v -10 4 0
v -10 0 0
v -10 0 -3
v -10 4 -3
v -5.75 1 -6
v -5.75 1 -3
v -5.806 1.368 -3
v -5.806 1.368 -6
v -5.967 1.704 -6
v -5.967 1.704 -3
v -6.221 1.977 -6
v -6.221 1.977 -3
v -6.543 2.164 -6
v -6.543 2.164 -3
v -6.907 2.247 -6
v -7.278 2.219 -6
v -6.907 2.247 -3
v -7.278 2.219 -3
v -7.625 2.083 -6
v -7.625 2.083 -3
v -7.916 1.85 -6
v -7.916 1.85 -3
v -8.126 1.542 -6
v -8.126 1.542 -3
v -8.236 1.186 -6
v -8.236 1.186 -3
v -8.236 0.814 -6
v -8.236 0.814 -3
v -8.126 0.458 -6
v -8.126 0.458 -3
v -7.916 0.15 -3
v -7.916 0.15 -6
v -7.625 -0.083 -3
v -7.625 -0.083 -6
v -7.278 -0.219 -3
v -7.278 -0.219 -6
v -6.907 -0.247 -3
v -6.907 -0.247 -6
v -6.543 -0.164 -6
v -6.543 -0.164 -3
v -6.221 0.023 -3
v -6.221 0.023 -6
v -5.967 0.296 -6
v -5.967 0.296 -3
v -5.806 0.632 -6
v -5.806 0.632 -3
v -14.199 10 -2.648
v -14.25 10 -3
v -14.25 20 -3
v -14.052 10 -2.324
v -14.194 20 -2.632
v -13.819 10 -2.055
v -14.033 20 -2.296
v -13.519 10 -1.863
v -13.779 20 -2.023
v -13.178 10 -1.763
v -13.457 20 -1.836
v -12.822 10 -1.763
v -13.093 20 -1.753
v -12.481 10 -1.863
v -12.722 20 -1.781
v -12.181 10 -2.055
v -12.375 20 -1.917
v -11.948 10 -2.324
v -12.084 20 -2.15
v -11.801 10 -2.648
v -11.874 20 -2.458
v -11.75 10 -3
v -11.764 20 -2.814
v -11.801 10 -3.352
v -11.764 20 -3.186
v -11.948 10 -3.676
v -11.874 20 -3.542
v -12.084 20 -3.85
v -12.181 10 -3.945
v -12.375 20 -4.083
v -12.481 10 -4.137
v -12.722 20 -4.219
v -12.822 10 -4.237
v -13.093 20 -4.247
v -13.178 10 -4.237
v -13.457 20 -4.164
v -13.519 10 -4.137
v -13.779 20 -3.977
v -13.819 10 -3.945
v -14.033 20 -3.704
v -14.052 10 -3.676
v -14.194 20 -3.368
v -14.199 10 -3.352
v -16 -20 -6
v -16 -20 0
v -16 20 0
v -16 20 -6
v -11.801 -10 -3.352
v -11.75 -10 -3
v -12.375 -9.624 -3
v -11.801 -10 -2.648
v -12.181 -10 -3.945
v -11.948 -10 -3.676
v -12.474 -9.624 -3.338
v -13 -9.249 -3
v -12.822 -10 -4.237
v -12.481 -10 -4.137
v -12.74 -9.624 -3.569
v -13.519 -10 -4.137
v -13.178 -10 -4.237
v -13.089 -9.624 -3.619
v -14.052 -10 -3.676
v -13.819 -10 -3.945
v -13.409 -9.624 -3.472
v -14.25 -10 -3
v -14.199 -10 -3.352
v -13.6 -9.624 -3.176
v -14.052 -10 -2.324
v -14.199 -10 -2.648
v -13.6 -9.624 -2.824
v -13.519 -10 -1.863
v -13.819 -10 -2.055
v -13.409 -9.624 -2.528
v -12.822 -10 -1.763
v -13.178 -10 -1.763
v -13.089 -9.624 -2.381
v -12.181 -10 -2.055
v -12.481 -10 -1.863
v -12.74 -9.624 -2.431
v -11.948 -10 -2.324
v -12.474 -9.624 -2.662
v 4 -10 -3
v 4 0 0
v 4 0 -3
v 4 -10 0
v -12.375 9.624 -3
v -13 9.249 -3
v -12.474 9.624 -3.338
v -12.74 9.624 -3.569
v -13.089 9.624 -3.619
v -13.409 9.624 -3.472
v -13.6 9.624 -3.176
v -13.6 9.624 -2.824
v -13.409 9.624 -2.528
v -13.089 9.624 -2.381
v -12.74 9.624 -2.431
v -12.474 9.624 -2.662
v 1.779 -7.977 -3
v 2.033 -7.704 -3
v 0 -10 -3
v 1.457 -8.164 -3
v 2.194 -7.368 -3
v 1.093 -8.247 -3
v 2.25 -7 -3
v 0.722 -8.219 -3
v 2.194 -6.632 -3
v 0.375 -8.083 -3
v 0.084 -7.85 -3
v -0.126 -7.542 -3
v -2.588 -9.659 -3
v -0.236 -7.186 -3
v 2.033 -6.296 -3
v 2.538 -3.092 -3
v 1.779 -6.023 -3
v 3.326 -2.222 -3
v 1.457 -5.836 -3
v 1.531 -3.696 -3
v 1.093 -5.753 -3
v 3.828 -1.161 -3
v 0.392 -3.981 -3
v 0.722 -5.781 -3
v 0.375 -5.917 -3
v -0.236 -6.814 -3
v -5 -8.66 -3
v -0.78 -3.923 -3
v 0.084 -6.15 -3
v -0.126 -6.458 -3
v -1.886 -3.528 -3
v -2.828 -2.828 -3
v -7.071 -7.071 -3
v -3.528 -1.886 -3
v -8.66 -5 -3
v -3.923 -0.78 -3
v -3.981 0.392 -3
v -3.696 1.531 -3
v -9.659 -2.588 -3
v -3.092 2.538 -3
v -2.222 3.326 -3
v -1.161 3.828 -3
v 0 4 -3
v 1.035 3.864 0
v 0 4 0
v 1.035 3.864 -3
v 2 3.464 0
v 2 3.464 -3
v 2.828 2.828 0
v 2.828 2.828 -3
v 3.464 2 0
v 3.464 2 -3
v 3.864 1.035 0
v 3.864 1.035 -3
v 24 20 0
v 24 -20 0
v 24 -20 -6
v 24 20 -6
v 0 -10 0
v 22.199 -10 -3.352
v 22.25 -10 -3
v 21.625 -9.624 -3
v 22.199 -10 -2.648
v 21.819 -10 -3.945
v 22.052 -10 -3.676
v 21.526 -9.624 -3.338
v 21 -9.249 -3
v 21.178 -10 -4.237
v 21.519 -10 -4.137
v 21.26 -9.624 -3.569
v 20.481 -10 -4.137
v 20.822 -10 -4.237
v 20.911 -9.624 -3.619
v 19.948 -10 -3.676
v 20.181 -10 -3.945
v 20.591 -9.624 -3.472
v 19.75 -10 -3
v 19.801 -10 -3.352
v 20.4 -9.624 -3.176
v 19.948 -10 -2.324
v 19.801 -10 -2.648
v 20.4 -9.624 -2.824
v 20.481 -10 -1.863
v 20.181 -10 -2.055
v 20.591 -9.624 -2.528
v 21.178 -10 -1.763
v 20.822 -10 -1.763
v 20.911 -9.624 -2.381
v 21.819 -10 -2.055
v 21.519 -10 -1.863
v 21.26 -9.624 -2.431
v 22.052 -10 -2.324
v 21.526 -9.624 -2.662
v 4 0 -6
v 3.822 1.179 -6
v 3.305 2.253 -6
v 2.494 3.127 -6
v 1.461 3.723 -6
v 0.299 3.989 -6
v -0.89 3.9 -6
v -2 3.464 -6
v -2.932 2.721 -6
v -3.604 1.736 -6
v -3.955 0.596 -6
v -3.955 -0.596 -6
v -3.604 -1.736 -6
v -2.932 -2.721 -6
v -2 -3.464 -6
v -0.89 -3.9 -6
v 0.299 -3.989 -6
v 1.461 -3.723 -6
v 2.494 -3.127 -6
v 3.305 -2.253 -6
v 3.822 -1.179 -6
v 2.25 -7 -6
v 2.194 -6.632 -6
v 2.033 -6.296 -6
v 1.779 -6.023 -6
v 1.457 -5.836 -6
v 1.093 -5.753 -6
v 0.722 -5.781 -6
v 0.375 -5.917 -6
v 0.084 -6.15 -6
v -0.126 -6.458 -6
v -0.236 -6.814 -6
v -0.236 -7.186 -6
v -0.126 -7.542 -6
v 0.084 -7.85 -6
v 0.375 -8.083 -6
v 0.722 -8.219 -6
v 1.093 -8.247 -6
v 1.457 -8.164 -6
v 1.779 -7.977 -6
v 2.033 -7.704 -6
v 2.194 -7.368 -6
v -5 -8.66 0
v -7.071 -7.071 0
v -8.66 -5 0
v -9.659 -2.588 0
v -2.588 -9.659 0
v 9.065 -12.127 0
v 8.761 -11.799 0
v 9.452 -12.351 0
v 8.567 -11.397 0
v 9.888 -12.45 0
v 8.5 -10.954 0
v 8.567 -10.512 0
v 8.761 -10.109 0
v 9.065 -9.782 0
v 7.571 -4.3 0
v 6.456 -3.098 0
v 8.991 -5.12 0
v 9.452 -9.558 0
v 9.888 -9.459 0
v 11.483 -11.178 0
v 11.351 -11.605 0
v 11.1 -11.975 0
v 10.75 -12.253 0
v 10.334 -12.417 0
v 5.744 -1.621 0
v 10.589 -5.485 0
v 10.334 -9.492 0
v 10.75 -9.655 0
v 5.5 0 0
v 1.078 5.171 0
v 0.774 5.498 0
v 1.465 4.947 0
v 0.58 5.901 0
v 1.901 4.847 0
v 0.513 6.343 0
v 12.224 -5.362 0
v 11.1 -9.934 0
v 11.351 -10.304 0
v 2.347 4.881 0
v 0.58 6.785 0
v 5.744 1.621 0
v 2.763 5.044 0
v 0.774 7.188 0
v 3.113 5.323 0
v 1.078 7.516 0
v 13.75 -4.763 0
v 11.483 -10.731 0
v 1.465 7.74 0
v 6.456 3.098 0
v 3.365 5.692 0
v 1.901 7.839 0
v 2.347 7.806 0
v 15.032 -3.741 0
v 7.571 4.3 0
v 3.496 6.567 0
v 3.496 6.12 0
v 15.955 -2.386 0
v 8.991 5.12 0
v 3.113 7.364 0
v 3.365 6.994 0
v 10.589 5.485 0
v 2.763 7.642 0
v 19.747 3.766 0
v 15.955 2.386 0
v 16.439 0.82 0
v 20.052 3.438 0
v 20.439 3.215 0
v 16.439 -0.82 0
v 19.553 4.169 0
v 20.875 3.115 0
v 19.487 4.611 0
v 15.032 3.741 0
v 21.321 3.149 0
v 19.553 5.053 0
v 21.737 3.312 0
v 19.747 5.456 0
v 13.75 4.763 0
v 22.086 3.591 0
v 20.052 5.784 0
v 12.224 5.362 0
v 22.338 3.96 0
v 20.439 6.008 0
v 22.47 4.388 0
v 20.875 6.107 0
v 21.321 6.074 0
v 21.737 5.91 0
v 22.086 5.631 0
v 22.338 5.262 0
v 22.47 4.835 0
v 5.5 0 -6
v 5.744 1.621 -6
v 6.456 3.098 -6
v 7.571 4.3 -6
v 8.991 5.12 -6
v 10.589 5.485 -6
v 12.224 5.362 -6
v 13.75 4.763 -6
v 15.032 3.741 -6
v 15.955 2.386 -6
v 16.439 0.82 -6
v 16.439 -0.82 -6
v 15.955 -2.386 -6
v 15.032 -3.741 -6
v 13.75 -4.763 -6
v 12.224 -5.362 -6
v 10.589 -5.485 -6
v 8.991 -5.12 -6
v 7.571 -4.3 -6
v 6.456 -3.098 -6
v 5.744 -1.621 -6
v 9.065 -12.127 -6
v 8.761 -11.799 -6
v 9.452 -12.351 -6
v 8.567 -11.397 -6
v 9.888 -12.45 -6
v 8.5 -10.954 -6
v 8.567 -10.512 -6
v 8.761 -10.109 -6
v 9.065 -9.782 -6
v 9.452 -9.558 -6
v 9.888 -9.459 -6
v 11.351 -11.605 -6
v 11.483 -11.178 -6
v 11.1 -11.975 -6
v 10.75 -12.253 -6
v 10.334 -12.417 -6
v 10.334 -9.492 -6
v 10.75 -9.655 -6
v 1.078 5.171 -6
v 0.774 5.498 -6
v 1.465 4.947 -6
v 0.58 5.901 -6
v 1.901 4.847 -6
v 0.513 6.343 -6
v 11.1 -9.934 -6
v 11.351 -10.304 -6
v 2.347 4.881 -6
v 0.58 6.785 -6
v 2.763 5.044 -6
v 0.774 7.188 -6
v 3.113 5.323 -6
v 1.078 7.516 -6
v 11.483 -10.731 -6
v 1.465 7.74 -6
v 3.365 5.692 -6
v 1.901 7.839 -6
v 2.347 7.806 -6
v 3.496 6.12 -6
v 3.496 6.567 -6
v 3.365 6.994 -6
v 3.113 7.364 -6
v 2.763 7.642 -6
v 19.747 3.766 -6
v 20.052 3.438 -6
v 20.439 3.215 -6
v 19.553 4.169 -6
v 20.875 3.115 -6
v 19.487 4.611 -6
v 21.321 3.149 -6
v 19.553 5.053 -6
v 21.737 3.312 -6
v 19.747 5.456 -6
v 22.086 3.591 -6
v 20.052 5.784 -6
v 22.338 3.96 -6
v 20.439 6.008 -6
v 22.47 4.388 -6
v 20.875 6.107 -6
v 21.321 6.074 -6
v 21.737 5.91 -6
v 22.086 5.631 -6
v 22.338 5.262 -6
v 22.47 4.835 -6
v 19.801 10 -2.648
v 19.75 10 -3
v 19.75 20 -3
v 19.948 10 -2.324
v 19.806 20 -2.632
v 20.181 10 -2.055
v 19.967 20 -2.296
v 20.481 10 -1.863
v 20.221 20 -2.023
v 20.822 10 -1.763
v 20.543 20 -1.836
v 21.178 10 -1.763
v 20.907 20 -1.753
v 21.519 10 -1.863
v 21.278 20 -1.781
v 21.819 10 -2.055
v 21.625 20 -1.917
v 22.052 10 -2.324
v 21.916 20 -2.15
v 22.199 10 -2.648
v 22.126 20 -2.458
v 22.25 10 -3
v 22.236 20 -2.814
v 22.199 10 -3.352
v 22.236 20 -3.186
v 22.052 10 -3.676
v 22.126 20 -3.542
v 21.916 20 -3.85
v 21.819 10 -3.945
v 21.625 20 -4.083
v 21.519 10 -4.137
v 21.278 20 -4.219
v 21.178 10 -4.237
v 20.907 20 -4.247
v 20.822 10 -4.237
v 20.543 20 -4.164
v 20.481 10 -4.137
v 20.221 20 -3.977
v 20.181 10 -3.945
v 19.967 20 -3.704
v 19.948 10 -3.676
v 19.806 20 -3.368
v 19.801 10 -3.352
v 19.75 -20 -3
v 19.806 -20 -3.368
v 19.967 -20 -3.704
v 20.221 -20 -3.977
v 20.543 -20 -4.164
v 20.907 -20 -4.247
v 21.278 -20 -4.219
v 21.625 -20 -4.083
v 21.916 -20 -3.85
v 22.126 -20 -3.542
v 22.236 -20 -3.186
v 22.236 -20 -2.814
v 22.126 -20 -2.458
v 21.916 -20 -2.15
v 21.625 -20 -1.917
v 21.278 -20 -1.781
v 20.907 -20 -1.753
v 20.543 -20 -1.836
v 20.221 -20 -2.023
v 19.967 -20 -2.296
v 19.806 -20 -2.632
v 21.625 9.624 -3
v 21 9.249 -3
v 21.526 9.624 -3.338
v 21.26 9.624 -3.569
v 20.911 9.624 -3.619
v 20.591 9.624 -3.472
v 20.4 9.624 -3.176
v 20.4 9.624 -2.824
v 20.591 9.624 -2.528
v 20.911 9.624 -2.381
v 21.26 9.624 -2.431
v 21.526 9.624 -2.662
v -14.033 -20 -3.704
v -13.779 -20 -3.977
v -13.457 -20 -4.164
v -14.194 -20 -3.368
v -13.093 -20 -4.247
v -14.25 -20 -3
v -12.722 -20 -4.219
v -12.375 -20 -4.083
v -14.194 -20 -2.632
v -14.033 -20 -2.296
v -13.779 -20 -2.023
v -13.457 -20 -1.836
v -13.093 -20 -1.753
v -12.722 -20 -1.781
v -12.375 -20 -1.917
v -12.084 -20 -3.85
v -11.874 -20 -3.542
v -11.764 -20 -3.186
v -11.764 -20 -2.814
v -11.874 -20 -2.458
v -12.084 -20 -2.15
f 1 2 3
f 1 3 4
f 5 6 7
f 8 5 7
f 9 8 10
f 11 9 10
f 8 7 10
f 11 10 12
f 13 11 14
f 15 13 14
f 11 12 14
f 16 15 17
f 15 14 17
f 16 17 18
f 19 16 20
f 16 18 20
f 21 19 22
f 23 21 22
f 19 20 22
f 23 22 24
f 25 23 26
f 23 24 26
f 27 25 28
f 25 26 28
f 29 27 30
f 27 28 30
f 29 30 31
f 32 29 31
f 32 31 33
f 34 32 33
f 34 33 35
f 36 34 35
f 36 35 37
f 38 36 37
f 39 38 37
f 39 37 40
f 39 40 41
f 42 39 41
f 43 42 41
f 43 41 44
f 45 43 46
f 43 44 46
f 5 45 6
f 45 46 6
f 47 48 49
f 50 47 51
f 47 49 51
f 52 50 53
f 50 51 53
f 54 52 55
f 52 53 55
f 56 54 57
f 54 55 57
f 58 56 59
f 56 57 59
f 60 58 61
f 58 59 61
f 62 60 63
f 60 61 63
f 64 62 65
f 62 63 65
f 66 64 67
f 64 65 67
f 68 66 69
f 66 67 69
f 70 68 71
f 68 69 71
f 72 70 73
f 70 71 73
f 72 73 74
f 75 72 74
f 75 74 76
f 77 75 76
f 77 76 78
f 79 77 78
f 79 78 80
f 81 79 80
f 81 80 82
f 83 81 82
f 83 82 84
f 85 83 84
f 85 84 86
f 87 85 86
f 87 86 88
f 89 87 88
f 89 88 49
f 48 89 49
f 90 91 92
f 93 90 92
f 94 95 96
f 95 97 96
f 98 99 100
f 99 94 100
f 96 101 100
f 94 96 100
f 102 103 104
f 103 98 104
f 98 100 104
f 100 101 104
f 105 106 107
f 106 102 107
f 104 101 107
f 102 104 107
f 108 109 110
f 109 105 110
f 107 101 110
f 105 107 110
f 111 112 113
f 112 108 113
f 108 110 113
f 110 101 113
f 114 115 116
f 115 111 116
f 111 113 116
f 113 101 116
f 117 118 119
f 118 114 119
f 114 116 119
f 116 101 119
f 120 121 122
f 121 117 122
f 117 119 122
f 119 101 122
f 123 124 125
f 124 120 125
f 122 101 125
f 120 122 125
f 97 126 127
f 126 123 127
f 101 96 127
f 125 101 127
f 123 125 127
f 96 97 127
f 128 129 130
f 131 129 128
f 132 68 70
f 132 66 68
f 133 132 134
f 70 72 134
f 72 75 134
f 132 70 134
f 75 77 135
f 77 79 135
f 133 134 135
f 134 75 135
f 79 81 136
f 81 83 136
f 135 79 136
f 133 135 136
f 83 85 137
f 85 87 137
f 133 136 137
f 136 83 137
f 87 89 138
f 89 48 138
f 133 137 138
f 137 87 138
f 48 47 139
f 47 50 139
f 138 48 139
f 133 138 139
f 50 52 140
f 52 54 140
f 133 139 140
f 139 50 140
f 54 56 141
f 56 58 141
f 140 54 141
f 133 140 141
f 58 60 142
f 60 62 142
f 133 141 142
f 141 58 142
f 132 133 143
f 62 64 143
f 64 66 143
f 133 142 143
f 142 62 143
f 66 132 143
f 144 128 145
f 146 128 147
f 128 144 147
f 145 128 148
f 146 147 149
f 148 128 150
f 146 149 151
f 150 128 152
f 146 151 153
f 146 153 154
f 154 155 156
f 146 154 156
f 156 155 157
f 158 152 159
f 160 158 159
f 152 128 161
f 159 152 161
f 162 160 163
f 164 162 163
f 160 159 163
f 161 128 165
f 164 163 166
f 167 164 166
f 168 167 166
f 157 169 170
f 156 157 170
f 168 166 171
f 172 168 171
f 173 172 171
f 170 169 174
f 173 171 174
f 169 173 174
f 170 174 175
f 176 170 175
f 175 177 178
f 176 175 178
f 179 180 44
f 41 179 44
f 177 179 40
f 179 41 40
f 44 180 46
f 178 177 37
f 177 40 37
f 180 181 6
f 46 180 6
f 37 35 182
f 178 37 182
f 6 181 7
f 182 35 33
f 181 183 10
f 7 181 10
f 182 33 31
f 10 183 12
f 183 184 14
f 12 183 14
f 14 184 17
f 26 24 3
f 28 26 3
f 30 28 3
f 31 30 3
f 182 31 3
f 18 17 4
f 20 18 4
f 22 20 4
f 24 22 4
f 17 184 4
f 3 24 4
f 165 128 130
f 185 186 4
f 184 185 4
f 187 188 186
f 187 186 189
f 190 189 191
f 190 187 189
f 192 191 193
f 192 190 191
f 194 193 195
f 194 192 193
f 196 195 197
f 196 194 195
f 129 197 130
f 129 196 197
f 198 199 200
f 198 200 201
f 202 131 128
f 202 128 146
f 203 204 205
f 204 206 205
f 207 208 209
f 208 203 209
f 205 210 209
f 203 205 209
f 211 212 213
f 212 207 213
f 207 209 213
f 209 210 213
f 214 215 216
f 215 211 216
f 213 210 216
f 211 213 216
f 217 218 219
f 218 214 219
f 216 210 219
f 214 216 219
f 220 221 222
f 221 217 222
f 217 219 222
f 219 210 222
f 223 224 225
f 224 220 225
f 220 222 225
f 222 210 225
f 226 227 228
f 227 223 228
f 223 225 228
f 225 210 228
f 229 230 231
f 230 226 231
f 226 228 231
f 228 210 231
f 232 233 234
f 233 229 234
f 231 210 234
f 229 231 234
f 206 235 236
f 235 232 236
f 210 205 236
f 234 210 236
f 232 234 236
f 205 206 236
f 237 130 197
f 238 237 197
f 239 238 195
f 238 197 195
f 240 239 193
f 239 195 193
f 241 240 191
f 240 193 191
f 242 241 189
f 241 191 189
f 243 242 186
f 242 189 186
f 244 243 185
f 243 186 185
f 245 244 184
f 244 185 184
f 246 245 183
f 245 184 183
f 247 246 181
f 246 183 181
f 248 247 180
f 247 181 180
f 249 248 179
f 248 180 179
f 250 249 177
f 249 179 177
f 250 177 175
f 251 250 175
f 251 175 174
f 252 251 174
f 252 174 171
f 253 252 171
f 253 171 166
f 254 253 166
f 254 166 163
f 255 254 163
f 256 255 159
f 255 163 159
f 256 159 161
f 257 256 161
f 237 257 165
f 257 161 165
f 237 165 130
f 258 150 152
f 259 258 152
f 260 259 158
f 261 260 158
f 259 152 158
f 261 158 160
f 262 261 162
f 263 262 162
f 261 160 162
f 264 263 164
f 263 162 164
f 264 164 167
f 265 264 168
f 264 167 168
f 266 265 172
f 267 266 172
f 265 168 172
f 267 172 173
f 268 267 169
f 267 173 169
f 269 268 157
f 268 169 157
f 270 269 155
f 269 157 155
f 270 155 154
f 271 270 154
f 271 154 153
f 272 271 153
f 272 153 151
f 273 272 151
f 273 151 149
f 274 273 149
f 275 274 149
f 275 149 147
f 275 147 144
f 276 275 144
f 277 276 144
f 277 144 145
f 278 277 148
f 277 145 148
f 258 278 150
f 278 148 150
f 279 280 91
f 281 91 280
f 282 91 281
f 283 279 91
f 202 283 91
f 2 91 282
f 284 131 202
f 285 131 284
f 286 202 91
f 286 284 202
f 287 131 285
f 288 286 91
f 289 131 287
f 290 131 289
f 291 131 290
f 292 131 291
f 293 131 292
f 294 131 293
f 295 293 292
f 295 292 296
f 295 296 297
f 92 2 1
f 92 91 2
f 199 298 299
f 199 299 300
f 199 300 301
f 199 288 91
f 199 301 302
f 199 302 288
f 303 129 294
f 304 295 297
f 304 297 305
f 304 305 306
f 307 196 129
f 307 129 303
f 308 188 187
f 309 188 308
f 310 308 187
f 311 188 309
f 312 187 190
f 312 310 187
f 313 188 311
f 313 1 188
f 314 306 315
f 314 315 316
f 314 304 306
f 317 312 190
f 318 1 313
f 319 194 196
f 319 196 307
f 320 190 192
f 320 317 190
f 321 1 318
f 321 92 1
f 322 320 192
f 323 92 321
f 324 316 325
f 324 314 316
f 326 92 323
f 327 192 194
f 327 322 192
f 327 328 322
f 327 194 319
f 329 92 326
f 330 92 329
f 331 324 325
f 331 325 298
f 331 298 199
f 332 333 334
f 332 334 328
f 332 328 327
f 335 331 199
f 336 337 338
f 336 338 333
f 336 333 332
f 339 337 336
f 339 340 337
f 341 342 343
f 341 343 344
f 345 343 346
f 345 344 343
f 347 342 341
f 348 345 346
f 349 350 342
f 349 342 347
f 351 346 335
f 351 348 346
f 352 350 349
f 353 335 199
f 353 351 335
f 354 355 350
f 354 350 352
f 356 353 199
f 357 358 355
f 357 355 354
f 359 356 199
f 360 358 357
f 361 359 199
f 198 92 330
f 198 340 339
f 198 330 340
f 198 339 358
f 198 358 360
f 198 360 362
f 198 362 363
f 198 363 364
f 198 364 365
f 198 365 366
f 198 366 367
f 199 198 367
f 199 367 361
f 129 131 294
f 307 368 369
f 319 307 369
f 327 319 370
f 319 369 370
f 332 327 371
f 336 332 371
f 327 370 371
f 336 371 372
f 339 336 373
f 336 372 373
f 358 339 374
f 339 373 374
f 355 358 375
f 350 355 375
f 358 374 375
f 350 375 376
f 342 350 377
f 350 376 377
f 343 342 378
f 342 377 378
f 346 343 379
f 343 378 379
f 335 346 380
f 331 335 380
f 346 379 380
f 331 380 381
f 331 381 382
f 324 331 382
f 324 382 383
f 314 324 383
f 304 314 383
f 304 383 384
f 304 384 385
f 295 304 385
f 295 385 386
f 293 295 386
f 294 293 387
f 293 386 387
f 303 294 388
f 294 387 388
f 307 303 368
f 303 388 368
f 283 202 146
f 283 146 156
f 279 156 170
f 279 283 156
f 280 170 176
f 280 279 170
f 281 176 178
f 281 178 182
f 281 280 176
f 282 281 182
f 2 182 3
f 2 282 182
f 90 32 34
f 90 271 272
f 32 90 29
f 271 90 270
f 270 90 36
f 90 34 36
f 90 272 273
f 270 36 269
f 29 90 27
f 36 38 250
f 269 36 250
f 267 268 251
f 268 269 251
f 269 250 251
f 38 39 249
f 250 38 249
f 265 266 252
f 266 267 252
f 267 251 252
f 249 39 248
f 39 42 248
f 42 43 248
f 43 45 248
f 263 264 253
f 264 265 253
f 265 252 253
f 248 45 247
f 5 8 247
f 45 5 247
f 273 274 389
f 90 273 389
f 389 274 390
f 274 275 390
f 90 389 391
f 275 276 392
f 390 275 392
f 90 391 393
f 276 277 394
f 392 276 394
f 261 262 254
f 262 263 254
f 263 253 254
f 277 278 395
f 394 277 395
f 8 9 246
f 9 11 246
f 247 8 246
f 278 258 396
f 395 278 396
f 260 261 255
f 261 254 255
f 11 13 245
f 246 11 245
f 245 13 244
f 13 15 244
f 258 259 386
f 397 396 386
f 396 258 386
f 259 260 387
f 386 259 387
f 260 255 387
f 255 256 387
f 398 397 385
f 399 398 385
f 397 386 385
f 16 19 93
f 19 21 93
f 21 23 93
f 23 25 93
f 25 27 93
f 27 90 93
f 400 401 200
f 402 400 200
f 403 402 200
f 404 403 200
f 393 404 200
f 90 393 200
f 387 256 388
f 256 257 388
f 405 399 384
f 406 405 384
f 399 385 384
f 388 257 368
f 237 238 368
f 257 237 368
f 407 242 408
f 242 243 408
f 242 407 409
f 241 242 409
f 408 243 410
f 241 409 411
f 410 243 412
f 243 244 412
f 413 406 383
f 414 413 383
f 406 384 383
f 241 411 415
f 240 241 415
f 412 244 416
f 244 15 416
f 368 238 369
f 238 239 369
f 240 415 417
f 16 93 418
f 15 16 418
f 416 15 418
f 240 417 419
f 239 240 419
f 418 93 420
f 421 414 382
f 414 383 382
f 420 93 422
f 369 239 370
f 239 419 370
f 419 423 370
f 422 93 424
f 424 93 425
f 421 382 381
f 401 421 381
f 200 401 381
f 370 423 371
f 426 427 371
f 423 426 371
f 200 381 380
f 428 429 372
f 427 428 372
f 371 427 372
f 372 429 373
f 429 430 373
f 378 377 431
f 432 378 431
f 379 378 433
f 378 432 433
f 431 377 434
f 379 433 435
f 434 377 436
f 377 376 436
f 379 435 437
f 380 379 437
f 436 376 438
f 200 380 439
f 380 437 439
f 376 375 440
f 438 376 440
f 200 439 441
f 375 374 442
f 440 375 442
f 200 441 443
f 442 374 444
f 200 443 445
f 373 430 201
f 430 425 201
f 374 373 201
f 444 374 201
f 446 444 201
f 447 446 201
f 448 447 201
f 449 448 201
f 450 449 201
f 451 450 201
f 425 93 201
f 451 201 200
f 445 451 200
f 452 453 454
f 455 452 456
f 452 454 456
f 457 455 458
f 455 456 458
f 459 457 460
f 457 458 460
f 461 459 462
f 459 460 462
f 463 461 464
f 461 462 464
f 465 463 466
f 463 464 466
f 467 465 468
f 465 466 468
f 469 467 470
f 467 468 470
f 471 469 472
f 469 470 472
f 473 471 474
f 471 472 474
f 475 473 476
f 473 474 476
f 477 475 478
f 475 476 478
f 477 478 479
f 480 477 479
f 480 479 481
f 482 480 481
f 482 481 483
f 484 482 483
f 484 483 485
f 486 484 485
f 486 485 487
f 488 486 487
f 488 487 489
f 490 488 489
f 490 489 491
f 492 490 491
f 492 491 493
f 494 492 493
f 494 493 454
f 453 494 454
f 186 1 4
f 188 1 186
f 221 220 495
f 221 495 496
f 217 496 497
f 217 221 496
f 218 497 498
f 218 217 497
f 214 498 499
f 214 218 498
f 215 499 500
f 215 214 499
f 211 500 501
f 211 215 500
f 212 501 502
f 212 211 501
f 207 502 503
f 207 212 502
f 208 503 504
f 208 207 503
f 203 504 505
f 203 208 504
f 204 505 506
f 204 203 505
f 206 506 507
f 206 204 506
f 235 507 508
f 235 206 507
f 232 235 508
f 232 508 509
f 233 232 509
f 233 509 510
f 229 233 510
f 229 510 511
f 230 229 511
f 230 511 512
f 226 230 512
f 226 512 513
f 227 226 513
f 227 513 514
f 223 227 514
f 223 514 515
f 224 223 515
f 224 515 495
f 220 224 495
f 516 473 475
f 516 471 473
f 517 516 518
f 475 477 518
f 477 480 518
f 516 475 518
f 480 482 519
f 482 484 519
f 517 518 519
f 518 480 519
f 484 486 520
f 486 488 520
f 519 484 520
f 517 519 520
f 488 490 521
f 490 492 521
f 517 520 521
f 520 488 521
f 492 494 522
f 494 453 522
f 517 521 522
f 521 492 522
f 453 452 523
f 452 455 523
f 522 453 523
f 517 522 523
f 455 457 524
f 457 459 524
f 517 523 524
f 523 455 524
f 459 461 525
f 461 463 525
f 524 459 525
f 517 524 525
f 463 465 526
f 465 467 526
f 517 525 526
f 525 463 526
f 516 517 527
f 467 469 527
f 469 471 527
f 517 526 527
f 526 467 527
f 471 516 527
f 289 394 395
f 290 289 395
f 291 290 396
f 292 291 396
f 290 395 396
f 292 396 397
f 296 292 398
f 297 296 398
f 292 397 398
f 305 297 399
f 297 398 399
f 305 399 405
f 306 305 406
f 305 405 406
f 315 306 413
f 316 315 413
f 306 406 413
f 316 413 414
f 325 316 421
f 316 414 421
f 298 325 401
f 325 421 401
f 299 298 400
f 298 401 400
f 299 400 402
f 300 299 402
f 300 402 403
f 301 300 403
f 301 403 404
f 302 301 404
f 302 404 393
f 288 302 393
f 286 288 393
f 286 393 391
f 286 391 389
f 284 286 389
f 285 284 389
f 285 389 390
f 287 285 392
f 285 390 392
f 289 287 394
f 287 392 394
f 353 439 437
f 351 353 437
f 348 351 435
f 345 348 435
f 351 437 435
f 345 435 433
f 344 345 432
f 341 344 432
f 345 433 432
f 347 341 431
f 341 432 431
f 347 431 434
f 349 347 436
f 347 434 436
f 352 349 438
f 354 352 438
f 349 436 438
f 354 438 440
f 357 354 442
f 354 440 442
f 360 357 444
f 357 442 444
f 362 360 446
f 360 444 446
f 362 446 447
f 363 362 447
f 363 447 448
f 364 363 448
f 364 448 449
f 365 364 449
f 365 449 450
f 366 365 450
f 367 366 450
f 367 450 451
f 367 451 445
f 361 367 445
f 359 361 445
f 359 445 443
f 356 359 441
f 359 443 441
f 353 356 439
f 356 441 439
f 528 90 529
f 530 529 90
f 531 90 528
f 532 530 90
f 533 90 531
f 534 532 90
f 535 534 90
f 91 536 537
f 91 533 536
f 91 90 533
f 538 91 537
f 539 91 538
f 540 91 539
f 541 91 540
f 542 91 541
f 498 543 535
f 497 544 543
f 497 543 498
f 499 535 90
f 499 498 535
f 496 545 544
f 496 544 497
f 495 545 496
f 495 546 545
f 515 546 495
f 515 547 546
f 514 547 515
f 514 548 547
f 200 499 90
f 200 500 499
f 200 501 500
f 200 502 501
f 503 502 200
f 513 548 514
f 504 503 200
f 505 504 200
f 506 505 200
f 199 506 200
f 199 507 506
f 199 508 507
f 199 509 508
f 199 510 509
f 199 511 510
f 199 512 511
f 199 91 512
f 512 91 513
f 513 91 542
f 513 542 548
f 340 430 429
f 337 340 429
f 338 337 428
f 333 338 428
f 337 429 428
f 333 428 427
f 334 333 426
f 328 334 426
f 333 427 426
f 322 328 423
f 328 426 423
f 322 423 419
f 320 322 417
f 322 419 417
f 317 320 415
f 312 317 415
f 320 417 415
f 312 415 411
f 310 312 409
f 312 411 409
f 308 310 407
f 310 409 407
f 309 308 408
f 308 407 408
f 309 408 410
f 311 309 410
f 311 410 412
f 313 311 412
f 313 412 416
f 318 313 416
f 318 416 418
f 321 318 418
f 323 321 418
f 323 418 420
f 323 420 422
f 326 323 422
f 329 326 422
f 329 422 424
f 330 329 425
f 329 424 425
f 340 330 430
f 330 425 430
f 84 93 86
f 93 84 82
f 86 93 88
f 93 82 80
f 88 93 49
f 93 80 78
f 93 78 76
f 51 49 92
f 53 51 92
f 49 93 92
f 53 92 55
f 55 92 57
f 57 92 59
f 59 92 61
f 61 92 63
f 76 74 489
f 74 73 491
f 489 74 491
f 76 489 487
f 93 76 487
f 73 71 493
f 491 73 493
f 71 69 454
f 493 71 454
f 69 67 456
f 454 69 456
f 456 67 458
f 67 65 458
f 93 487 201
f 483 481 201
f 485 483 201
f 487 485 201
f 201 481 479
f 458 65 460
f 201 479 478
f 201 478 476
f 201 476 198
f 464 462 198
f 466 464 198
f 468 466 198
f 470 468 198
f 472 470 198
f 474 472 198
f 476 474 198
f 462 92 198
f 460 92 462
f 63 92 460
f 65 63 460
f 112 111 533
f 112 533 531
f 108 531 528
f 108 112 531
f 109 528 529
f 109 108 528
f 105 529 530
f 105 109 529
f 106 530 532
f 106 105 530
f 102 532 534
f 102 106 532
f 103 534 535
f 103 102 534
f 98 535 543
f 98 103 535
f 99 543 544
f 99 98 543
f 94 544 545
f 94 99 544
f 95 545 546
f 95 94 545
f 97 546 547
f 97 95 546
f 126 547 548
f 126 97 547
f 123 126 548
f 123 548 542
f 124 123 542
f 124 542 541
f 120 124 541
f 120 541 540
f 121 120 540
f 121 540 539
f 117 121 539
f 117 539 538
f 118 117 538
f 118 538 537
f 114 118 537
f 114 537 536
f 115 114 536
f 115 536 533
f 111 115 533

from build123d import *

# Parameters (mm, degrees)
SKETCH1_W          = 40
SKETCH1_H          = 40
EXTRUDE1_DEPTH     = 6
SKETCH8_R          = 5.5
CUT_EXTRUDE6_DEPTH = 6
SKETCH5_R          = 1.5
CUT_EXTRUDE4_DEPTH = 6
CIRPATTERN1_COUNT  = 3
EXTRUDE15_DEPTH    = 3
SKETCH35_R         = 1.25
EXTRUDE17_DEPTH    = 3
SKETCH34_R         = 4
EXTRUDE16_DEPTH    = 3
SKETCH27_R         = 1.25
EXTRUDE6_DEPTH     = 10
EXTRUDE18_START    = -10
SKETCH36_R         = 1.25
EXTRUDE18_DEPTH    = 10


# Read off the part's stored shape, not the designer's step: M3 Tapped Hole1
with BuildPart() as part:
    # Sketch1 → Extrude1 (new body)
    with BuildSketch(Plane.XY):
        with Locations((4, 0)):
            Rectangle(SKETCH1_W, SKETCH1_H)
    extrude(amount=-EXTRUDE1_DEPTH)

    # Sketch8 → Cut-Extrude6 (cut)
    with BuildSketch(Plane(origin=(0, 0, -6), x_dir=(-1, 0, 0), z_dir=(0, 0, -1))):
        with Locations((-11, 0)):
            Circle(SKETCH8_R)
    extrude(amount=-CUT_EXTRUDE6_DEPTH, mode=Mode.SUBTRACT)

    # Sketch5 → Cut-Extrude4 (cut)
    with BuildSketch(Plane(origin=(0, 0, -6), x_dir=(-1, 0, 0), z_dir=(0, 0, -1))):
        with Locations((-10, -10.95445115)):
            Circle(SKETCH5_R)
    cut_extrude4 = extrude(amount=-CUT_EXTRUDE4_DEPTH, mode=Mode.SUBTRACT)

    # CirPattern1: Cut-Extrude4 ×3 about axis
    cirpattern1_axis = Axis((11, 0, 0), (0, 0, 1))
    for i in range(1, CIRPATTERN1_COUNT):
        add(cut_extrude4.rotate(cirpattern1_axis, i * 360 / CIRPATTERN1_COUNT), mode=Mode.SUBTRACT)

    # Sketch29 → Extrude15 (cut)
    with BuildSketch(Plane.XY):
        with BuildLine():
            Line((4, 0), (4, -10))
            Line((4, -10), (0, -10))
            ThreePointArc((0, -10), (-7.071067812, -7.071067812), (-10, 0))
            Line((-10, 0), (-10, 4))
            Line((-10, 4), (0, 4))
            ThreePointArc((0, 4), (2.828427125, 2.828427125), (4, 0))
        make_face()
    extrude(amount=-EXTRUDE15_DEPTH, mode=Mode.SUBTRACT)

    # Sketch35 → Extrude17 (cut)
    with BuildSketch(Plane.XY.offset(-3)):
        with Locations((1, -7)):
            Circle(SKETCH35_R)
        with Locations((-7, 1)):
            Circle(SKETCH35_R)
    extrude(amount=-EXTRUDE17_DEPTH, mode=Mode.SUBTRACT)

    # Sketch34 → Extrude16 (cut)
    with BuildSketch(Plane.XY.offset(-3)):
        Circle(SKETCH34_R)
    extrude(amount=-EXTRUDE16_DEPTH, mode=Mode.SUBTRACT)

    # Sketch27 → Extrude6 (cut)
    with BuildSketch(Plane(origin=(0, 20, 0), x_dir=(1, 0, 0), z_dir=(0, 1, 0))):
        with Locations(Location((-13, 3, 0), (0, 0, 180))):
            Circle(SKETCH27_R)
        with Locations(Location((21, 3, 0), (0, 0, 180))):
            Circle(SKETCH27_R)
    extrude(amount=-EXTRUDE6_DEPTH, mode=Mode.SUBTRACT)

    # Sketch36 → Extrude18 (cut)
    with BuildSketch(Plane.XZ.offset(20).offset(EXTRUDE18_START)):
        with Locations(Location((-13, -3, 0), (0, 0, 180))):
            Circle(SKETCH36_R)
        with Locations(Location((21, -3, 0), (0, 0, 180))):
            Circle(SKETCH36_R)
    extrude(amount=EXTRUDE18_DEPTH, mode=Mode.SUBTRACT)

    # M3 Tapped Hole1 outline → M3 Tapped Hole1 (revolve, cut)
    with BuildSketch(Plane(origin=(21, 0, -3), x_dir=(1, 0, 0), z_dir=(0, 0, 1))):
        Polygon((1.25, -10), (0, -9.248924226), (0, -10), align=None)
        Polygon((0, 10), (0, 9.248924226), (1.25, 10), align=None)
    revolve(axis=Axis((21, 0, -3), (0, 1, 0)), mode=Mode.SUBTRACT)

    # M3 Tapped Hole1 2 outline → M3 Tapped Hole1 2 (revolve, cut)
    with BuildSketch(Plane(origin=(-13, 0, -3), x_dir=(1, 0, 0), z_dir=(0, 0, 1))):
        Polygon((1.25, -10), (0, -9.248924226), (0, -10), align=None)
        Polygon((0, 10), (0, 9.248924226), (1.25, 10), align=None)
    revolve(axis=Axis((-13, 0, -3), (0, 1, 0)), mode=Mode.SUBTRACT)


solid = part.part
